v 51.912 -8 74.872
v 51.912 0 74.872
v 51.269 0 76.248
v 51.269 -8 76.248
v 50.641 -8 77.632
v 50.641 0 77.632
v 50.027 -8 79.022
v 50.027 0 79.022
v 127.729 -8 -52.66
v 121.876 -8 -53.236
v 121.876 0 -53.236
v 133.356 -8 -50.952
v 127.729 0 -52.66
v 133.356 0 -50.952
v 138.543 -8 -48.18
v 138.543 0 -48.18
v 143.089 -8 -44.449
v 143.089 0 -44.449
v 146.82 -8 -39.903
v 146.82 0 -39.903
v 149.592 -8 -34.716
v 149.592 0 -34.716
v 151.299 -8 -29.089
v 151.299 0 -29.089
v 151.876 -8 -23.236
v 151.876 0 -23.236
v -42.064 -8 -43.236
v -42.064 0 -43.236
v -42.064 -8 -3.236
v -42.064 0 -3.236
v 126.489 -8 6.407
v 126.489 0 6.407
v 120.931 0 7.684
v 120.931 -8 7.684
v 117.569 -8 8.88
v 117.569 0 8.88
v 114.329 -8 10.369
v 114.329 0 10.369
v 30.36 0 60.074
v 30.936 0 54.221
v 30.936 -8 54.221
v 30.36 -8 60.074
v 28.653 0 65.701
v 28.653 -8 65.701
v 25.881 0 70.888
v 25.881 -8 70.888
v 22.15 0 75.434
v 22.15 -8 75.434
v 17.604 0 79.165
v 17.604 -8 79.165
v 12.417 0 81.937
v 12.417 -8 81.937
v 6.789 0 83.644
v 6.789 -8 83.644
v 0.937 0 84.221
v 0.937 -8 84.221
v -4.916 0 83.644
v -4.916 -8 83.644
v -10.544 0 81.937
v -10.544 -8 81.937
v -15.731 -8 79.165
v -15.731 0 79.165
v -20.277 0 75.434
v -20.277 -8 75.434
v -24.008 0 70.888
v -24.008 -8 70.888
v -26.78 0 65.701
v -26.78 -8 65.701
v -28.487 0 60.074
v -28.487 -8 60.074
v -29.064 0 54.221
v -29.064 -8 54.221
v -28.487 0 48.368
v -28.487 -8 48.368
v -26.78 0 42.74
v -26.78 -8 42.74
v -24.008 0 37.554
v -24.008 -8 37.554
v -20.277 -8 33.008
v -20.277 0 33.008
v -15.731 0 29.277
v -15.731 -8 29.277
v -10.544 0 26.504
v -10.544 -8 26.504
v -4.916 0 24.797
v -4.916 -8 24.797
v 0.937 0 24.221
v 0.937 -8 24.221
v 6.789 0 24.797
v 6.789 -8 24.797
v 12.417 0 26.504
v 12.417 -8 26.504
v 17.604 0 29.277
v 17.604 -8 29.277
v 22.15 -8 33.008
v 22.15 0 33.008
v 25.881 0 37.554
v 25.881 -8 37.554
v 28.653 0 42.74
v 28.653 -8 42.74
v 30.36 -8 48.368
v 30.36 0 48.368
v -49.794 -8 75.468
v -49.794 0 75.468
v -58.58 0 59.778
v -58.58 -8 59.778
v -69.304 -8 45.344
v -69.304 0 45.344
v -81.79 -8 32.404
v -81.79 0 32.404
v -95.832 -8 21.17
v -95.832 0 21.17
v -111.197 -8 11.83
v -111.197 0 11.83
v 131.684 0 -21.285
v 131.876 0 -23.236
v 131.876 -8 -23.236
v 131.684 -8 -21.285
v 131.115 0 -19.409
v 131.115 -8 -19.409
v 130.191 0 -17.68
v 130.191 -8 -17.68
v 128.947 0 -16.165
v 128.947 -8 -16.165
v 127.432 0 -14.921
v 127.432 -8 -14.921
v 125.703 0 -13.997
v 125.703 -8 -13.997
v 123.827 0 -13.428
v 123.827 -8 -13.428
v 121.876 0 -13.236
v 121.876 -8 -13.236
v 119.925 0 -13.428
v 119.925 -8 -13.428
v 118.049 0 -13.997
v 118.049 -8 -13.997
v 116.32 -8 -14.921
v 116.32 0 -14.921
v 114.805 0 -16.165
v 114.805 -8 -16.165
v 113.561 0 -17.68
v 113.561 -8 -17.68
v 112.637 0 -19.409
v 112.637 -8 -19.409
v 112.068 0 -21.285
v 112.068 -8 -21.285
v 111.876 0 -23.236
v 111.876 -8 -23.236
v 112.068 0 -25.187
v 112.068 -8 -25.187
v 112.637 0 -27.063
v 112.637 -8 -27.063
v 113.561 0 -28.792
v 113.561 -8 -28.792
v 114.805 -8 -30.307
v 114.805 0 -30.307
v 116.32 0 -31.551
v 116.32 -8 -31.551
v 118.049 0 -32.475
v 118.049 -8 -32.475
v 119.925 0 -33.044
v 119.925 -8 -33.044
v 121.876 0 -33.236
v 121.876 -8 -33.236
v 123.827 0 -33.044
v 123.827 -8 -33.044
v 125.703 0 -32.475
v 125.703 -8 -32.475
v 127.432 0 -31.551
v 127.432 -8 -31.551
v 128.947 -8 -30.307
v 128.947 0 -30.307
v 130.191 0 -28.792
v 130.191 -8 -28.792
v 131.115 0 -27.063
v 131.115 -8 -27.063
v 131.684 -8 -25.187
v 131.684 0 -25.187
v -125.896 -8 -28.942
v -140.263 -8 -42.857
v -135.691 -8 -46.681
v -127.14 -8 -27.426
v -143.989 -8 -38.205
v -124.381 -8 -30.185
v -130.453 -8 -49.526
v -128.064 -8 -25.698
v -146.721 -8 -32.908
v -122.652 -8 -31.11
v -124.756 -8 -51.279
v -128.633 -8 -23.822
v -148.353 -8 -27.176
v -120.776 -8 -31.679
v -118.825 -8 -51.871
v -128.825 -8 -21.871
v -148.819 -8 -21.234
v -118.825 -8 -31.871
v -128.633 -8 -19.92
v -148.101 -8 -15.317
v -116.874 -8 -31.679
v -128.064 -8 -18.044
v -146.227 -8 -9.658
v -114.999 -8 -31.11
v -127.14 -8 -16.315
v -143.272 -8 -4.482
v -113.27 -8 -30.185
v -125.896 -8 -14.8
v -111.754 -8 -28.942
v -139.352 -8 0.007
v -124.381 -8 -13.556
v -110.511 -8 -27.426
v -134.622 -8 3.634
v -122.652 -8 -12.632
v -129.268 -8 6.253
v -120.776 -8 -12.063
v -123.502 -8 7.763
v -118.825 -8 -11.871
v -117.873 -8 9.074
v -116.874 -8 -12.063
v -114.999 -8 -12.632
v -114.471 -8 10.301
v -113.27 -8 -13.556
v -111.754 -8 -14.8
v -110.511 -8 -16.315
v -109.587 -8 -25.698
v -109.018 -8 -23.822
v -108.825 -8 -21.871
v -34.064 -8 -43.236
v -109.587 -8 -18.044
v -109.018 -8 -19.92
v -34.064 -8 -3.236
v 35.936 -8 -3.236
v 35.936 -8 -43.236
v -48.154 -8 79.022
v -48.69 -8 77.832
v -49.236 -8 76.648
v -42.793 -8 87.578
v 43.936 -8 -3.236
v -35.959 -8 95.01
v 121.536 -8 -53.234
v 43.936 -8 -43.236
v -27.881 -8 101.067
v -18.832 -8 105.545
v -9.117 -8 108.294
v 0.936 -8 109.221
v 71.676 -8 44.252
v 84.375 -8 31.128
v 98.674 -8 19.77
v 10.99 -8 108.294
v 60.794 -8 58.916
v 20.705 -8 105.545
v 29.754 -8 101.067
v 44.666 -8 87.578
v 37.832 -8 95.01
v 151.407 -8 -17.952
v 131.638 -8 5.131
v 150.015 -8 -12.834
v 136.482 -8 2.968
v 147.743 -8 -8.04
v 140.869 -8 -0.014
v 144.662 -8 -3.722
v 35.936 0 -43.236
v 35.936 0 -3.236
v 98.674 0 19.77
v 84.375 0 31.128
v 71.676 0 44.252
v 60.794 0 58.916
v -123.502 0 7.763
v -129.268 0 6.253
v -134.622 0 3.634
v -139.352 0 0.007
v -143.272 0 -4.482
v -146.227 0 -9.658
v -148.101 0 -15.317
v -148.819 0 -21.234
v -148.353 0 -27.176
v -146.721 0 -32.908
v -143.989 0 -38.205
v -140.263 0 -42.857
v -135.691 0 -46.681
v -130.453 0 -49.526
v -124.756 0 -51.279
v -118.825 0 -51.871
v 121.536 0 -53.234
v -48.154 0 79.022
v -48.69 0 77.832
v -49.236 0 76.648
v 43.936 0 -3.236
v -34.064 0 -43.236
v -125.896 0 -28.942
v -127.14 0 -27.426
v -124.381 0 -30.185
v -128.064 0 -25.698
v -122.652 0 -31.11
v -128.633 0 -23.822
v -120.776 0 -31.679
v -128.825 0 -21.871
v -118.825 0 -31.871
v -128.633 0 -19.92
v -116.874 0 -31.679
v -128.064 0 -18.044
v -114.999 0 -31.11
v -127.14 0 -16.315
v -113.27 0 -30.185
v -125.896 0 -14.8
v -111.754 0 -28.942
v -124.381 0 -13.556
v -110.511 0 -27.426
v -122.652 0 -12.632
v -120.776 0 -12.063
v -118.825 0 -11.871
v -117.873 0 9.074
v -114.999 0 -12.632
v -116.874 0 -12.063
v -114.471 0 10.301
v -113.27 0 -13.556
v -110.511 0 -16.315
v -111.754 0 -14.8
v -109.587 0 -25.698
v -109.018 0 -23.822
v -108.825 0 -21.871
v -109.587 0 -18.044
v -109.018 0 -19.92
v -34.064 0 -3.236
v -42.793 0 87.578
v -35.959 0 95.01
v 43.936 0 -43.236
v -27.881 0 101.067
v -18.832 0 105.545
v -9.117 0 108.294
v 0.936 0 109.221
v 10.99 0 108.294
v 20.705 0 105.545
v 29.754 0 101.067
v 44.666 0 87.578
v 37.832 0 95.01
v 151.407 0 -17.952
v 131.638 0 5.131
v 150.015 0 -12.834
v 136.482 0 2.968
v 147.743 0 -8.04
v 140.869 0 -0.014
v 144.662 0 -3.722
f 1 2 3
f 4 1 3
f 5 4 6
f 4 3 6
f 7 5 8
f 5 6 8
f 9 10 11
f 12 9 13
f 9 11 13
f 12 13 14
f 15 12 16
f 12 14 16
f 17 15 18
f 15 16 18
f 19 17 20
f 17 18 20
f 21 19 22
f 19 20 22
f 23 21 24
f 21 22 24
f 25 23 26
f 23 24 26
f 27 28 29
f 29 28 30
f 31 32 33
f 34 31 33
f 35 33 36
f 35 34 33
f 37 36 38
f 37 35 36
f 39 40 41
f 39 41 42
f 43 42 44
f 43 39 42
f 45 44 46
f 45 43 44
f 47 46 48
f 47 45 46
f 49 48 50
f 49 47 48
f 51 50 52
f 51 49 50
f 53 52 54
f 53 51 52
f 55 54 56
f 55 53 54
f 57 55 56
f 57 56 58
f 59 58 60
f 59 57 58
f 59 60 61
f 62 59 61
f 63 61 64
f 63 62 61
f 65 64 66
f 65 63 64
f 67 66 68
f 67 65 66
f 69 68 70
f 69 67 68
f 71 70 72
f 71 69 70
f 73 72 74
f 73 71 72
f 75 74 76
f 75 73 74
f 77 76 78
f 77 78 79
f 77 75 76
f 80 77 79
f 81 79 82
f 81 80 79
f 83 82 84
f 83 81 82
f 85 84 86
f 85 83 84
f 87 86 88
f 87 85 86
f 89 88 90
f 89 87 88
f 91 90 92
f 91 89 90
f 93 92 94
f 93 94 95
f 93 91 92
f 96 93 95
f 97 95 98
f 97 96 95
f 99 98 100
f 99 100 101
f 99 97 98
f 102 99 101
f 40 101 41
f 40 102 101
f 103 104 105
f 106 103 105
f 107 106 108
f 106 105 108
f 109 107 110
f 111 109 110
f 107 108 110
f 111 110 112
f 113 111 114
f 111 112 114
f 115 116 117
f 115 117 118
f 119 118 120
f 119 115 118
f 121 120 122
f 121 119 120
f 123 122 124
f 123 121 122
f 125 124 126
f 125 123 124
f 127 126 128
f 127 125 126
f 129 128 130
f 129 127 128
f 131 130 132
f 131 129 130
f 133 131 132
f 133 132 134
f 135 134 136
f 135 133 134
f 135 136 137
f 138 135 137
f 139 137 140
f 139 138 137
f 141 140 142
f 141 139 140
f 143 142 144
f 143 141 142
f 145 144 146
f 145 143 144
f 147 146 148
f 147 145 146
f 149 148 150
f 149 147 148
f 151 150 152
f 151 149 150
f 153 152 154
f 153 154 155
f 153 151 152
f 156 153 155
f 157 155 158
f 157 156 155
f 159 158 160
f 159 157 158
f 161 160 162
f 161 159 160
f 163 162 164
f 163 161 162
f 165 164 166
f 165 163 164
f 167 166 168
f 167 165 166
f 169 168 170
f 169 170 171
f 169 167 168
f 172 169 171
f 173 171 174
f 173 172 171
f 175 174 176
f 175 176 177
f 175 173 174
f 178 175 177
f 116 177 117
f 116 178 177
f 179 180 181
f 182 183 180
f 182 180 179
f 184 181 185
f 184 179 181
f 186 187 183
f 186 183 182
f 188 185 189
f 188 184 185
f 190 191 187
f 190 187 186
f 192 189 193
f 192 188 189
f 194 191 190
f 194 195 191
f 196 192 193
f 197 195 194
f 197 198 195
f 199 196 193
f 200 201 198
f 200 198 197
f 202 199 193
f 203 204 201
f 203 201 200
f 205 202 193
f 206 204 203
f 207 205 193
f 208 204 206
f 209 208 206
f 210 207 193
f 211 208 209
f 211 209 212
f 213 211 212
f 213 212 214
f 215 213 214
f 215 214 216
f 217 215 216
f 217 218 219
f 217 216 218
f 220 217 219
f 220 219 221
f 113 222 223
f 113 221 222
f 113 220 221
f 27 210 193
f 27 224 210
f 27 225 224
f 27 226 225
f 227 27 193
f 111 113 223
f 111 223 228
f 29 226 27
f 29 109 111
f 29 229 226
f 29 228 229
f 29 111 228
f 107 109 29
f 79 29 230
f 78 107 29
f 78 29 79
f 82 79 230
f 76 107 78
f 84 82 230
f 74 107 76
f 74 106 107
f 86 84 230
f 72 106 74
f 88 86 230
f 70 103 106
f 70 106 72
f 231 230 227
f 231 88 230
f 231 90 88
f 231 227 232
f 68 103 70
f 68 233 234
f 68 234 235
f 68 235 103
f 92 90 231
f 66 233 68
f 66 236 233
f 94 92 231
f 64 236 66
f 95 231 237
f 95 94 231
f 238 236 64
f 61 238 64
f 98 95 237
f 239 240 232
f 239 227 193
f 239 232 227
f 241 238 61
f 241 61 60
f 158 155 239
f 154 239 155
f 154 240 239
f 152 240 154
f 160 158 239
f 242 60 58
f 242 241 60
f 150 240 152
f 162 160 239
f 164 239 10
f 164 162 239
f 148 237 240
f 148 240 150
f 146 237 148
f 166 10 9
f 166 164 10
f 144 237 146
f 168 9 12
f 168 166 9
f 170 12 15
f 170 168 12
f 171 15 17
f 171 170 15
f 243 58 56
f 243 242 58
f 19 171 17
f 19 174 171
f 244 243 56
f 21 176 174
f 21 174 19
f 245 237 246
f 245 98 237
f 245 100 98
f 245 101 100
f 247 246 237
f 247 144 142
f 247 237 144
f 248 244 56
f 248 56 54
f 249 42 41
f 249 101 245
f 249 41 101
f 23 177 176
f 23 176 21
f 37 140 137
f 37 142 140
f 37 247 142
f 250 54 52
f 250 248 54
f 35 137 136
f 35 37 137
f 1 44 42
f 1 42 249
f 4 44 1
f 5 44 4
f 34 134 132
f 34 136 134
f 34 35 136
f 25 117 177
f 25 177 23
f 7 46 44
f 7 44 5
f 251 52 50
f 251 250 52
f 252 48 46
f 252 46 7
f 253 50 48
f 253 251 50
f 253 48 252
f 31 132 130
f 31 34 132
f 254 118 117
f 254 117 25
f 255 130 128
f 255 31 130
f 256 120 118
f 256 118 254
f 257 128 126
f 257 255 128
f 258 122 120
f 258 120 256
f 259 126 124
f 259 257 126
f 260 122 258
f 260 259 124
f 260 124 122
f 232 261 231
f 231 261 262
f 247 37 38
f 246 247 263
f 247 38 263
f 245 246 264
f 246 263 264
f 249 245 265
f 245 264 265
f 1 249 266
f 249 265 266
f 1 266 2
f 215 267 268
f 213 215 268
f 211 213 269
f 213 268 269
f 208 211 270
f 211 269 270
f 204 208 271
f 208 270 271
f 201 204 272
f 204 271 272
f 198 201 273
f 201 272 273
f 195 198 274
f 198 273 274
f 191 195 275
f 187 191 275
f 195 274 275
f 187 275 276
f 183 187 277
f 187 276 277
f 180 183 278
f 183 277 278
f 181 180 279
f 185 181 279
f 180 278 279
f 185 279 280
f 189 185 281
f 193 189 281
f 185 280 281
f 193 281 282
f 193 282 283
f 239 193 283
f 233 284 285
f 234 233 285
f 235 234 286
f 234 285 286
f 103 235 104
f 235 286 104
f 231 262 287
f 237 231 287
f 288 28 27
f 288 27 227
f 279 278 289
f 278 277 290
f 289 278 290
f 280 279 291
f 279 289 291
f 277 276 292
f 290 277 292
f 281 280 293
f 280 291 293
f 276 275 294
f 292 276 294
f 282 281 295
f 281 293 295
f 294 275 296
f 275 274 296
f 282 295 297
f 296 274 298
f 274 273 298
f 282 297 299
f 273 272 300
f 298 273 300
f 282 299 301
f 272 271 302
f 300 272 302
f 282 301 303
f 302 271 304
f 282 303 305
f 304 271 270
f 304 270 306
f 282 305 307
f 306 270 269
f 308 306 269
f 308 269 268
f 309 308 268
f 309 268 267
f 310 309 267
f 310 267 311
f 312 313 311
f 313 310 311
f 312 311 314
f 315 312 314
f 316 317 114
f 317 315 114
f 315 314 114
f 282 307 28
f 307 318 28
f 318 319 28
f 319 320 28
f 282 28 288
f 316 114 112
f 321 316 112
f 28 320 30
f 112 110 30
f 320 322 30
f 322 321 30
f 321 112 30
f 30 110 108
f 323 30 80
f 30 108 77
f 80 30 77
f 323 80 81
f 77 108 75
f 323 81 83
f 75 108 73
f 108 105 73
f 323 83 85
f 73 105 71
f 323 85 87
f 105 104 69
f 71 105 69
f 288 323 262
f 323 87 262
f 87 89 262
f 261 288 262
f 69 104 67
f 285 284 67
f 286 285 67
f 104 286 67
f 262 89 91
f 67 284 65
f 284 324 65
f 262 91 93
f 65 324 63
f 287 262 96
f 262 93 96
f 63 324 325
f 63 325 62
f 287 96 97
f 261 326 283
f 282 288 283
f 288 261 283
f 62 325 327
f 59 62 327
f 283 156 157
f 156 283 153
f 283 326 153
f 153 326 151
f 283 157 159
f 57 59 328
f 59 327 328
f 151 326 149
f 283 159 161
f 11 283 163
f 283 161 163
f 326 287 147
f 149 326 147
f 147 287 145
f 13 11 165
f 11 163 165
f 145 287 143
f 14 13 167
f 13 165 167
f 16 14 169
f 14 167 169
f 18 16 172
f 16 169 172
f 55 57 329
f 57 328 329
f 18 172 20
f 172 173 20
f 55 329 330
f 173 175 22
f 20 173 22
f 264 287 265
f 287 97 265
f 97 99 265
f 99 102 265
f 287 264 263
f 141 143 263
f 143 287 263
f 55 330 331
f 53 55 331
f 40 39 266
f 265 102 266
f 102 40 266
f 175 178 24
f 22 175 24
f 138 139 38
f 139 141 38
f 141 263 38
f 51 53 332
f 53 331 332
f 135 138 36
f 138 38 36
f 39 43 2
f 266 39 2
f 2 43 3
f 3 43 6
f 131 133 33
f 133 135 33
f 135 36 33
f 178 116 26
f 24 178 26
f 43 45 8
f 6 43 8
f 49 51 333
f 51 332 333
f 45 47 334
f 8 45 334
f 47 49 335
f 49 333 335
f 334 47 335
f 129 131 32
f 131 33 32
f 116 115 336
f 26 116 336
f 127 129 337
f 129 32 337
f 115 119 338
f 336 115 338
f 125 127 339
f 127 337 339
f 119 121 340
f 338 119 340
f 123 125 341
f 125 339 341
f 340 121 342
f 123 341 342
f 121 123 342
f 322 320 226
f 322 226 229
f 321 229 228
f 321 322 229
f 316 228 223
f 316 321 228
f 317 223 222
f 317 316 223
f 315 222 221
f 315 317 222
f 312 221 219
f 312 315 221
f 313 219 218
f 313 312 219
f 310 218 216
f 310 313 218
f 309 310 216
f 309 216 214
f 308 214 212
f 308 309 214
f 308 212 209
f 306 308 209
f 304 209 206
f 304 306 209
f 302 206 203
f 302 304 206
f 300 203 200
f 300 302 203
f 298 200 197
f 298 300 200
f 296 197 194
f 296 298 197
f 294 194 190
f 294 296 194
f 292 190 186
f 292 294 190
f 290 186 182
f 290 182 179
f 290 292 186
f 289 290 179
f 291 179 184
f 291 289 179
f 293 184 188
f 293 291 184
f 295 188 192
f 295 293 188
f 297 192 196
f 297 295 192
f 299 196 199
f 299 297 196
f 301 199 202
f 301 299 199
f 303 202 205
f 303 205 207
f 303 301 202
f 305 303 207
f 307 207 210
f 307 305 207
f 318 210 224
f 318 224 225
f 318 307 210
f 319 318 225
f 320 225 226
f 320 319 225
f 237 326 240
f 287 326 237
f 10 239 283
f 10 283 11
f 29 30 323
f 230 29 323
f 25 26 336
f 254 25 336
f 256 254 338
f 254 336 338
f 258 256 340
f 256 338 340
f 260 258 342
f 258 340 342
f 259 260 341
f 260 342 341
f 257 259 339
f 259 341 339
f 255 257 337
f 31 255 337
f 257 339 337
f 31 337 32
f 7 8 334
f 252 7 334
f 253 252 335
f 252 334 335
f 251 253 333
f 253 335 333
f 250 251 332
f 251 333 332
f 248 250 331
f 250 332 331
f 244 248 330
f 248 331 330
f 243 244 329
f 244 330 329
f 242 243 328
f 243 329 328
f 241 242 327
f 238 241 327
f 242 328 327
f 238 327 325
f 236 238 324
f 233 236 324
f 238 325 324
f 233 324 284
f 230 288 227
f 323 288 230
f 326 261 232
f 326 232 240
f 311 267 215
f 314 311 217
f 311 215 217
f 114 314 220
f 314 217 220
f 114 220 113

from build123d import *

# Parameters (mm, degrees)
F0_R     = 10
F0_W     = 8
F0_H     = 40
F0_R_2   = 30
F1_DEPTH = 8
F2_R     = 40


with BuildPart() as f1:
    # F0 (on Front) → F1 (new body)
    with BuildSketch(Plane.XZ):
        with BuildLine():
            ThreePointArc((-118.825361, -51.870755), (-97.612157, -43.083959), (-88.825361, -21.870755))
            ThreePointArc((-88.825361, -21.870755), (-97.612157, -0.657552), (-118.825361, 8.129245))
            ThreePointArc((-118.825361, 8.129245), (-148.825361, -21.870755), (-118.825361, -51.870755))
        make_face()
        with Locations((-118.825361, -21.870755)):
            Circle(F0_R, mode=Mode.SUBTRACT)
        with BuildLine():
            ThreePointArc((-118.825361, 8.129245), (-97.612157, -0.657552), (-88.825361, -21.870755))
            ThreePointArc((-88.825361, -21.870755), (-97.612157, -43.083959), (-118.825361, -51.870755))
            Line((-118.825361, -51.870755), (121.535592, -53.234036))
            ThreePointArc((121.535592, -53.234036), (91.876372, -23.065815), (121.87589, 6.764034))
            ThreePointArc((121.87589, 6.764034), (80.764156, 34.521015), (51.912313, 74.871923))
            ThreePointArc((51.912313, 74.871923), (54.92108, 64.740607), (55.9365, 54.220856))
            ThreePointArc((55.9365, 54.220856), (-9.899421, 0.298849), (-49.793784, 75.467933))
            ThreePointArc((-49.793784, 75.467933), (-78.328518, 35.667172), (-118.825361, 8.129245))
        make_face()
        with Locations((-38.0635, -23.235966)):
            Rectangle(F0_W, F0_H, mode=Mode.SUBTRACT)
        with Locations((39.9365, -23.235966)):
            Rectangle(F0_W, F0_H, mode=Mode.SUBTRACT)
        with BuildLine():
            ThreePointArc((-48.154233, 79.022065), (-48.961587, 77.239269), (-49.793784, 75.467933))
            ThreePointArc((-49.793784, 75.467933), (-9.899421, 0.298849), (55.9365, 54.220856))
            ThreePointArc((55.9365, 54.220856), (54.92108, 64.740607), (51.912313, 74.871923))
            ThreePointArc((51.912313, 74.871923), (50.952881, 76.939321), (50.027233, 79.022065))
            ThreePointArc((50.027233, 79.022065), (0.9365, 109.220856), (-48.154233, 79.022065))
        make_face()
        with Locations((0.9365, 54.220856)):
            Circle(F0_R_2, mode=Mode.SUBTRACT)
        with BuildLine():
            ThreePointArc((121.87589, 6.764034), (91.876372, -23.065815), (121.535592, -53.234036))
            Line((121.535592, -53.234036), (121.87589, -53.235966))
            ThreePointArc((121.87589, -53.235966), (143.089093, -44.44917), (151.87589, -23.235966))
            ThreePointArc((151.87589, -23.235966), (143.089093, -2.022763), (121.87589, 6.764034))
        make_face()
        with Locations((121.87589, -23.235966)):
            Circle(F0_R, mode=Mode.SUBTRACT)
    extrude(amount=F1_DEPTH)

    # F2
    f2_edges = [f1.edges().sort_by_distance(p)[0] for p in [
        (-118.825361, -4, 8.129245),
        (121.87589, -4, 6.764034),
    ]]
    fillet(f2_edges, radius=F2_R)


solid = f1.part
